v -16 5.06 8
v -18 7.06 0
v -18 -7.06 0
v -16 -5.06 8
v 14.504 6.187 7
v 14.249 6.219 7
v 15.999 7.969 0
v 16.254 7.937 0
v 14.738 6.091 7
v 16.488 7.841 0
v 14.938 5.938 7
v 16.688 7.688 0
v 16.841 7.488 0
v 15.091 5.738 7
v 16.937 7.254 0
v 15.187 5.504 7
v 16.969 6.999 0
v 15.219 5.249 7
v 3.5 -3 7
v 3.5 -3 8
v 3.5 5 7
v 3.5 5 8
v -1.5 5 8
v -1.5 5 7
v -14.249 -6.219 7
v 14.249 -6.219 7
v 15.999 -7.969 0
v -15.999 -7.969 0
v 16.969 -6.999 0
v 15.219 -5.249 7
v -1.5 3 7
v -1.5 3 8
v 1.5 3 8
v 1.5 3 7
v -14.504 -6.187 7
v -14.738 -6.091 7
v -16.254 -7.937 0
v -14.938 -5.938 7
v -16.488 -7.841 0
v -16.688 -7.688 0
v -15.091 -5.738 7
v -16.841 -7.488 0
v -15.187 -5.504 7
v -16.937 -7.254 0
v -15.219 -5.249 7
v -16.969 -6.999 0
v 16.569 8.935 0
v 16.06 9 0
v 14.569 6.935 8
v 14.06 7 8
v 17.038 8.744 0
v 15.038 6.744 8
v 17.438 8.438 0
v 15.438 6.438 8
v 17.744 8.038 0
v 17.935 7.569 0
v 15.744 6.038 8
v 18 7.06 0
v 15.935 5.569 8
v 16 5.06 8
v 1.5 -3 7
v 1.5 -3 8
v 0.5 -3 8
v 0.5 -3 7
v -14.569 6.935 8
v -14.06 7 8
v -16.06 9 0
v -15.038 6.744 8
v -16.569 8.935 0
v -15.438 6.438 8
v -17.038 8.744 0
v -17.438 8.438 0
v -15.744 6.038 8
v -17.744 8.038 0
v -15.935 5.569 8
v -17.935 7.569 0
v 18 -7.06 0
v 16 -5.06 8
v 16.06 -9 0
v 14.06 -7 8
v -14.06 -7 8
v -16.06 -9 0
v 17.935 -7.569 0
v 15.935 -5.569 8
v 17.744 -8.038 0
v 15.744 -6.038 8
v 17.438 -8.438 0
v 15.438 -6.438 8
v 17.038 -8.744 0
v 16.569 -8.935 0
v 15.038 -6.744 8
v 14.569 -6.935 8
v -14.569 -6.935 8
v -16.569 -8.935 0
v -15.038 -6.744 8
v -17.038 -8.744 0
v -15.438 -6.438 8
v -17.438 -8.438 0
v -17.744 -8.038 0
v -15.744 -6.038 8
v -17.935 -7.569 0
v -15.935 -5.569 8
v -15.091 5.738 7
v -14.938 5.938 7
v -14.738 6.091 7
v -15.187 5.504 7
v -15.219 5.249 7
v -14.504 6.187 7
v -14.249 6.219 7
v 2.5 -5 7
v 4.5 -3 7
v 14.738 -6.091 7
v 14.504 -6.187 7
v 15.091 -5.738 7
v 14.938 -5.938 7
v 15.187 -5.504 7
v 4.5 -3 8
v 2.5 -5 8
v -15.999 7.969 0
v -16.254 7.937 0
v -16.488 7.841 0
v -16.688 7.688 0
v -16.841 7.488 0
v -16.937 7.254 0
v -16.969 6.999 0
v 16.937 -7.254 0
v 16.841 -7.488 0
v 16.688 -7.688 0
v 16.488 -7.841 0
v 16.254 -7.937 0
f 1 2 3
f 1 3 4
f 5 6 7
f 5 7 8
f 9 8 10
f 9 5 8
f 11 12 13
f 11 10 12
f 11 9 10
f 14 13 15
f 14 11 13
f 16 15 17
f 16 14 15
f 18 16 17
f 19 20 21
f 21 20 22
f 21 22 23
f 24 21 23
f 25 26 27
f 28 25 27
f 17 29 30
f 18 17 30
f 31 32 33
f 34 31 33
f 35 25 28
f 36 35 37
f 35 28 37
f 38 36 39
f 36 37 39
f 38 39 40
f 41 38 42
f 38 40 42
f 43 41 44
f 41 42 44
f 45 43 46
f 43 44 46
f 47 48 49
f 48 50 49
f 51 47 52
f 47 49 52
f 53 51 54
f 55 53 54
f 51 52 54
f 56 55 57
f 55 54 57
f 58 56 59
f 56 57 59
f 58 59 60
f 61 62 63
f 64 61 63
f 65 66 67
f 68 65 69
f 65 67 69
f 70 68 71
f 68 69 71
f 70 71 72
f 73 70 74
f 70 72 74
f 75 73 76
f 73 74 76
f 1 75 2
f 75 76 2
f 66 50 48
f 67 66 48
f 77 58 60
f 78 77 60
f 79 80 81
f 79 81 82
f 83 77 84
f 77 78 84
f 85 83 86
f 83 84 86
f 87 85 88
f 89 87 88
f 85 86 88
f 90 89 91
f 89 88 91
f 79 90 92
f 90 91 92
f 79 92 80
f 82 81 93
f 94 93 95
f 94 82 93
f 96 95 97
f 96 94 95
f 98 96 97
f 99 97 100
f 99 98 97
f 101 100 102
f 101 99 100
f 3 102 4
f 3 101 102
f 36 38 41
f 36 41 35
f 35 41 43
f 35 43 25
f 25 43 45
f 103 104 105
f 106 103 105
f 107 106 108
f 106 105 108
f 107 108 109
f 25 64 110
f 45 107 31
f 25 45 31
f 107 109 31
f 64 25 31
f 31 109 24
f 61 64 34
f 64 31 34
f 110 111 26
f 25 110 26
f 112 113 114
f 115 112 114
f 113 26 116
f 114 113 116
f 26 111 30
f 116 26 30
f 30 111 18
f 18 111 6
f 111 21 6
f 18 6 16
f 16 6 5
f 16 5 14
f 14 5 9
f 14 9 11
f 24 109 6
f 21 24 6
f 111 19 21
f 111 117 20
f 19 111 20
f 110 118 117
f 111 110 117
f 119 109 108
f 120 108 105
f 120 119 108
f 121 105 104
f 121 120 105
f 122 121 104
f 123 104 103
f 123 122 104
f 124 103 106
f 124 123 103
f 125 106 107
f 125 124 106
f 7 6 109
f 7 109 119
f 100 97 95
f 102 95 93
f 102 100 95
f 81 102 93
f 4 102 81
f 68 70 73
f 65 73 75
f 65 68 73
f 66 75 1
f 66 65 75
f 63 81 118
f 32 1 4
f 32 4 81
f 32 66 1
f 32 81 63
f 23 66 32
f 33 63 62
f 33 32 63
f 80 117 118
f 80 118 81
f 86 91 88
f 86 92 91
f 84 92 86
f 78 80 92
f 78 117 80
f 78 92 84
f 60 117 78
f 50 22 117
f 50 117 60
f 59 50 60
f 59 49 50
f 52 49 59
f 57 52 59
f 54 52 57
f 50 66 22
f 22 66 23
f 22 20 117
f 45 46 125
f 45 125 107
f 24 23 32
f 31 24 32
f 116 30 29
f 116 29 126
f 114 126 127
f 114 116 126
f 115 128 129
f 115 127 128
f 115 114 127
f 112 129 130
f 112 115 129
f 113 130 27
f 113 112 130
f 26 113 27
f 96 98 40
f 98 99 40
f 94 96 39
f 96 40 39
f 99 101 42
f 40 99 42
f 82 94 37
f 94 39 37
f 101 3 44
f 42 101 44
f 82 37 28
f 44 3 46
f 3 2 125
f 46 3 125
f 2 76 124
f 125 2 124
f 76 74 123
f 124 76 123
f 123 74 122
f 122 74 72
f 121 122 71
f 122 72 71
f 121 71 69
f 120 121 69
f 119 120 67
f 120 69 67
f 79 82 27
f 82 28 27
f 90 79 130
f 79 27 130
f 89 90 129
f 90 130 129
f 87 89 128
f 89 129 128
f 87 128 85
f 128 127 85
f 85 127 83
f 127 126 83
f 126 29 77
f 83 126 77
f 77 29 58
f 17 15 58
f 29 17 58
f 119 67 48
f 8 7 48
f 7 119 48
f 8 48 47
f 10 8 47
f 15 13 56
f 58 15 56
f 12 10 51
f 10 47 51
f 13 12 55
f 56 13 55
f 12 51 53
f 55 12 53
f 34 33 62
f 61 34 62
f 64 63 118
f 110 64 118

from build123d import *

# Parameters (mm, degrees)
SKETCH_W             = 36
SKETCH_H             = 18
PAD_DEPTH            = 8
POCKET_DEPTH         = 18.001
POCKET001_DEPTH      = 18.001
POCKET001_DEPTH_BACK = 18.001
FILLET_R             = 2
THICKNESS_T          = -1
POCKET002_DEPTH      = 1


with BuildPart() as part:
    # Sketch → Pad (new body)
    with BuildSketch(Plane.XY):
        Rectangle(SKETCH_W, SKETCH_H)
    extrude(amount=PAD_DEPTH)

    # Sketch001 (on Face1 of Pad) → Pocket (cut, through all)
    with BuildSketch(Plane.XZ.offset(9)):
        Polygon((-18, 8), (-18, 0), (-16, 8), align=None)
        Polygon((18, 8), (18, 0), (16, 8), align=None)
    extrude(amount=-POCKET_DEPTH, mode=Mode.SUBTRACT)

    # Sketch002 → Pocket001 (cut, two sides)
    with BuildSketch(Plane.YZ) as pocket001_sk:
        Polygon((-9, 8), (-7, 8), (-9, 0), align=None)
        Polygon((9, 8), (7, 8), (9, 0), align=None)
    extrude(amount=-POCKET001_DEPTH, mode=Mode.SUBTRACT)
    extrude(pocket001_sk.sketch, amount=POCKET001_DEPTH_BACK, mode=Mode.SUBTRACT)

    # Fillet
    fillet_edges = [part.edges().sort_by_distance(p)[0] for p in [
        (-17, 8, 4),
        (-17, -8, 4),
        (17, -8, 4),
        (17, 8, 4),
    ]]
    fillet(fillet_edges, radius=FILLET_R)

    # Thickness
    thickness_openings = [part.faces().sort_by_distance(p)[0] for p in [
        (0, 0, 0),
    ]]
    offset(amount=THICKNESS_T, openings=thickness_openings, kind=Kind.INTERSECTION)

    # Sketch004 (on Face9 of Thickness) → Pocket002 (cut)
    with BuildSketch(Plane.XY.offset(8)):
        Polygon((-1.5, 3), (1.5, 3), (1.5, -3), (0.5, -3), (2.5, -5), (4.5, -3), (3.5, -3), (3.5, 5), (-1.5, 5), align=None)
    extrude(amount=-POCKET002_DEPTH, mode=Mode.SUBTRACT)


solid = part.part
